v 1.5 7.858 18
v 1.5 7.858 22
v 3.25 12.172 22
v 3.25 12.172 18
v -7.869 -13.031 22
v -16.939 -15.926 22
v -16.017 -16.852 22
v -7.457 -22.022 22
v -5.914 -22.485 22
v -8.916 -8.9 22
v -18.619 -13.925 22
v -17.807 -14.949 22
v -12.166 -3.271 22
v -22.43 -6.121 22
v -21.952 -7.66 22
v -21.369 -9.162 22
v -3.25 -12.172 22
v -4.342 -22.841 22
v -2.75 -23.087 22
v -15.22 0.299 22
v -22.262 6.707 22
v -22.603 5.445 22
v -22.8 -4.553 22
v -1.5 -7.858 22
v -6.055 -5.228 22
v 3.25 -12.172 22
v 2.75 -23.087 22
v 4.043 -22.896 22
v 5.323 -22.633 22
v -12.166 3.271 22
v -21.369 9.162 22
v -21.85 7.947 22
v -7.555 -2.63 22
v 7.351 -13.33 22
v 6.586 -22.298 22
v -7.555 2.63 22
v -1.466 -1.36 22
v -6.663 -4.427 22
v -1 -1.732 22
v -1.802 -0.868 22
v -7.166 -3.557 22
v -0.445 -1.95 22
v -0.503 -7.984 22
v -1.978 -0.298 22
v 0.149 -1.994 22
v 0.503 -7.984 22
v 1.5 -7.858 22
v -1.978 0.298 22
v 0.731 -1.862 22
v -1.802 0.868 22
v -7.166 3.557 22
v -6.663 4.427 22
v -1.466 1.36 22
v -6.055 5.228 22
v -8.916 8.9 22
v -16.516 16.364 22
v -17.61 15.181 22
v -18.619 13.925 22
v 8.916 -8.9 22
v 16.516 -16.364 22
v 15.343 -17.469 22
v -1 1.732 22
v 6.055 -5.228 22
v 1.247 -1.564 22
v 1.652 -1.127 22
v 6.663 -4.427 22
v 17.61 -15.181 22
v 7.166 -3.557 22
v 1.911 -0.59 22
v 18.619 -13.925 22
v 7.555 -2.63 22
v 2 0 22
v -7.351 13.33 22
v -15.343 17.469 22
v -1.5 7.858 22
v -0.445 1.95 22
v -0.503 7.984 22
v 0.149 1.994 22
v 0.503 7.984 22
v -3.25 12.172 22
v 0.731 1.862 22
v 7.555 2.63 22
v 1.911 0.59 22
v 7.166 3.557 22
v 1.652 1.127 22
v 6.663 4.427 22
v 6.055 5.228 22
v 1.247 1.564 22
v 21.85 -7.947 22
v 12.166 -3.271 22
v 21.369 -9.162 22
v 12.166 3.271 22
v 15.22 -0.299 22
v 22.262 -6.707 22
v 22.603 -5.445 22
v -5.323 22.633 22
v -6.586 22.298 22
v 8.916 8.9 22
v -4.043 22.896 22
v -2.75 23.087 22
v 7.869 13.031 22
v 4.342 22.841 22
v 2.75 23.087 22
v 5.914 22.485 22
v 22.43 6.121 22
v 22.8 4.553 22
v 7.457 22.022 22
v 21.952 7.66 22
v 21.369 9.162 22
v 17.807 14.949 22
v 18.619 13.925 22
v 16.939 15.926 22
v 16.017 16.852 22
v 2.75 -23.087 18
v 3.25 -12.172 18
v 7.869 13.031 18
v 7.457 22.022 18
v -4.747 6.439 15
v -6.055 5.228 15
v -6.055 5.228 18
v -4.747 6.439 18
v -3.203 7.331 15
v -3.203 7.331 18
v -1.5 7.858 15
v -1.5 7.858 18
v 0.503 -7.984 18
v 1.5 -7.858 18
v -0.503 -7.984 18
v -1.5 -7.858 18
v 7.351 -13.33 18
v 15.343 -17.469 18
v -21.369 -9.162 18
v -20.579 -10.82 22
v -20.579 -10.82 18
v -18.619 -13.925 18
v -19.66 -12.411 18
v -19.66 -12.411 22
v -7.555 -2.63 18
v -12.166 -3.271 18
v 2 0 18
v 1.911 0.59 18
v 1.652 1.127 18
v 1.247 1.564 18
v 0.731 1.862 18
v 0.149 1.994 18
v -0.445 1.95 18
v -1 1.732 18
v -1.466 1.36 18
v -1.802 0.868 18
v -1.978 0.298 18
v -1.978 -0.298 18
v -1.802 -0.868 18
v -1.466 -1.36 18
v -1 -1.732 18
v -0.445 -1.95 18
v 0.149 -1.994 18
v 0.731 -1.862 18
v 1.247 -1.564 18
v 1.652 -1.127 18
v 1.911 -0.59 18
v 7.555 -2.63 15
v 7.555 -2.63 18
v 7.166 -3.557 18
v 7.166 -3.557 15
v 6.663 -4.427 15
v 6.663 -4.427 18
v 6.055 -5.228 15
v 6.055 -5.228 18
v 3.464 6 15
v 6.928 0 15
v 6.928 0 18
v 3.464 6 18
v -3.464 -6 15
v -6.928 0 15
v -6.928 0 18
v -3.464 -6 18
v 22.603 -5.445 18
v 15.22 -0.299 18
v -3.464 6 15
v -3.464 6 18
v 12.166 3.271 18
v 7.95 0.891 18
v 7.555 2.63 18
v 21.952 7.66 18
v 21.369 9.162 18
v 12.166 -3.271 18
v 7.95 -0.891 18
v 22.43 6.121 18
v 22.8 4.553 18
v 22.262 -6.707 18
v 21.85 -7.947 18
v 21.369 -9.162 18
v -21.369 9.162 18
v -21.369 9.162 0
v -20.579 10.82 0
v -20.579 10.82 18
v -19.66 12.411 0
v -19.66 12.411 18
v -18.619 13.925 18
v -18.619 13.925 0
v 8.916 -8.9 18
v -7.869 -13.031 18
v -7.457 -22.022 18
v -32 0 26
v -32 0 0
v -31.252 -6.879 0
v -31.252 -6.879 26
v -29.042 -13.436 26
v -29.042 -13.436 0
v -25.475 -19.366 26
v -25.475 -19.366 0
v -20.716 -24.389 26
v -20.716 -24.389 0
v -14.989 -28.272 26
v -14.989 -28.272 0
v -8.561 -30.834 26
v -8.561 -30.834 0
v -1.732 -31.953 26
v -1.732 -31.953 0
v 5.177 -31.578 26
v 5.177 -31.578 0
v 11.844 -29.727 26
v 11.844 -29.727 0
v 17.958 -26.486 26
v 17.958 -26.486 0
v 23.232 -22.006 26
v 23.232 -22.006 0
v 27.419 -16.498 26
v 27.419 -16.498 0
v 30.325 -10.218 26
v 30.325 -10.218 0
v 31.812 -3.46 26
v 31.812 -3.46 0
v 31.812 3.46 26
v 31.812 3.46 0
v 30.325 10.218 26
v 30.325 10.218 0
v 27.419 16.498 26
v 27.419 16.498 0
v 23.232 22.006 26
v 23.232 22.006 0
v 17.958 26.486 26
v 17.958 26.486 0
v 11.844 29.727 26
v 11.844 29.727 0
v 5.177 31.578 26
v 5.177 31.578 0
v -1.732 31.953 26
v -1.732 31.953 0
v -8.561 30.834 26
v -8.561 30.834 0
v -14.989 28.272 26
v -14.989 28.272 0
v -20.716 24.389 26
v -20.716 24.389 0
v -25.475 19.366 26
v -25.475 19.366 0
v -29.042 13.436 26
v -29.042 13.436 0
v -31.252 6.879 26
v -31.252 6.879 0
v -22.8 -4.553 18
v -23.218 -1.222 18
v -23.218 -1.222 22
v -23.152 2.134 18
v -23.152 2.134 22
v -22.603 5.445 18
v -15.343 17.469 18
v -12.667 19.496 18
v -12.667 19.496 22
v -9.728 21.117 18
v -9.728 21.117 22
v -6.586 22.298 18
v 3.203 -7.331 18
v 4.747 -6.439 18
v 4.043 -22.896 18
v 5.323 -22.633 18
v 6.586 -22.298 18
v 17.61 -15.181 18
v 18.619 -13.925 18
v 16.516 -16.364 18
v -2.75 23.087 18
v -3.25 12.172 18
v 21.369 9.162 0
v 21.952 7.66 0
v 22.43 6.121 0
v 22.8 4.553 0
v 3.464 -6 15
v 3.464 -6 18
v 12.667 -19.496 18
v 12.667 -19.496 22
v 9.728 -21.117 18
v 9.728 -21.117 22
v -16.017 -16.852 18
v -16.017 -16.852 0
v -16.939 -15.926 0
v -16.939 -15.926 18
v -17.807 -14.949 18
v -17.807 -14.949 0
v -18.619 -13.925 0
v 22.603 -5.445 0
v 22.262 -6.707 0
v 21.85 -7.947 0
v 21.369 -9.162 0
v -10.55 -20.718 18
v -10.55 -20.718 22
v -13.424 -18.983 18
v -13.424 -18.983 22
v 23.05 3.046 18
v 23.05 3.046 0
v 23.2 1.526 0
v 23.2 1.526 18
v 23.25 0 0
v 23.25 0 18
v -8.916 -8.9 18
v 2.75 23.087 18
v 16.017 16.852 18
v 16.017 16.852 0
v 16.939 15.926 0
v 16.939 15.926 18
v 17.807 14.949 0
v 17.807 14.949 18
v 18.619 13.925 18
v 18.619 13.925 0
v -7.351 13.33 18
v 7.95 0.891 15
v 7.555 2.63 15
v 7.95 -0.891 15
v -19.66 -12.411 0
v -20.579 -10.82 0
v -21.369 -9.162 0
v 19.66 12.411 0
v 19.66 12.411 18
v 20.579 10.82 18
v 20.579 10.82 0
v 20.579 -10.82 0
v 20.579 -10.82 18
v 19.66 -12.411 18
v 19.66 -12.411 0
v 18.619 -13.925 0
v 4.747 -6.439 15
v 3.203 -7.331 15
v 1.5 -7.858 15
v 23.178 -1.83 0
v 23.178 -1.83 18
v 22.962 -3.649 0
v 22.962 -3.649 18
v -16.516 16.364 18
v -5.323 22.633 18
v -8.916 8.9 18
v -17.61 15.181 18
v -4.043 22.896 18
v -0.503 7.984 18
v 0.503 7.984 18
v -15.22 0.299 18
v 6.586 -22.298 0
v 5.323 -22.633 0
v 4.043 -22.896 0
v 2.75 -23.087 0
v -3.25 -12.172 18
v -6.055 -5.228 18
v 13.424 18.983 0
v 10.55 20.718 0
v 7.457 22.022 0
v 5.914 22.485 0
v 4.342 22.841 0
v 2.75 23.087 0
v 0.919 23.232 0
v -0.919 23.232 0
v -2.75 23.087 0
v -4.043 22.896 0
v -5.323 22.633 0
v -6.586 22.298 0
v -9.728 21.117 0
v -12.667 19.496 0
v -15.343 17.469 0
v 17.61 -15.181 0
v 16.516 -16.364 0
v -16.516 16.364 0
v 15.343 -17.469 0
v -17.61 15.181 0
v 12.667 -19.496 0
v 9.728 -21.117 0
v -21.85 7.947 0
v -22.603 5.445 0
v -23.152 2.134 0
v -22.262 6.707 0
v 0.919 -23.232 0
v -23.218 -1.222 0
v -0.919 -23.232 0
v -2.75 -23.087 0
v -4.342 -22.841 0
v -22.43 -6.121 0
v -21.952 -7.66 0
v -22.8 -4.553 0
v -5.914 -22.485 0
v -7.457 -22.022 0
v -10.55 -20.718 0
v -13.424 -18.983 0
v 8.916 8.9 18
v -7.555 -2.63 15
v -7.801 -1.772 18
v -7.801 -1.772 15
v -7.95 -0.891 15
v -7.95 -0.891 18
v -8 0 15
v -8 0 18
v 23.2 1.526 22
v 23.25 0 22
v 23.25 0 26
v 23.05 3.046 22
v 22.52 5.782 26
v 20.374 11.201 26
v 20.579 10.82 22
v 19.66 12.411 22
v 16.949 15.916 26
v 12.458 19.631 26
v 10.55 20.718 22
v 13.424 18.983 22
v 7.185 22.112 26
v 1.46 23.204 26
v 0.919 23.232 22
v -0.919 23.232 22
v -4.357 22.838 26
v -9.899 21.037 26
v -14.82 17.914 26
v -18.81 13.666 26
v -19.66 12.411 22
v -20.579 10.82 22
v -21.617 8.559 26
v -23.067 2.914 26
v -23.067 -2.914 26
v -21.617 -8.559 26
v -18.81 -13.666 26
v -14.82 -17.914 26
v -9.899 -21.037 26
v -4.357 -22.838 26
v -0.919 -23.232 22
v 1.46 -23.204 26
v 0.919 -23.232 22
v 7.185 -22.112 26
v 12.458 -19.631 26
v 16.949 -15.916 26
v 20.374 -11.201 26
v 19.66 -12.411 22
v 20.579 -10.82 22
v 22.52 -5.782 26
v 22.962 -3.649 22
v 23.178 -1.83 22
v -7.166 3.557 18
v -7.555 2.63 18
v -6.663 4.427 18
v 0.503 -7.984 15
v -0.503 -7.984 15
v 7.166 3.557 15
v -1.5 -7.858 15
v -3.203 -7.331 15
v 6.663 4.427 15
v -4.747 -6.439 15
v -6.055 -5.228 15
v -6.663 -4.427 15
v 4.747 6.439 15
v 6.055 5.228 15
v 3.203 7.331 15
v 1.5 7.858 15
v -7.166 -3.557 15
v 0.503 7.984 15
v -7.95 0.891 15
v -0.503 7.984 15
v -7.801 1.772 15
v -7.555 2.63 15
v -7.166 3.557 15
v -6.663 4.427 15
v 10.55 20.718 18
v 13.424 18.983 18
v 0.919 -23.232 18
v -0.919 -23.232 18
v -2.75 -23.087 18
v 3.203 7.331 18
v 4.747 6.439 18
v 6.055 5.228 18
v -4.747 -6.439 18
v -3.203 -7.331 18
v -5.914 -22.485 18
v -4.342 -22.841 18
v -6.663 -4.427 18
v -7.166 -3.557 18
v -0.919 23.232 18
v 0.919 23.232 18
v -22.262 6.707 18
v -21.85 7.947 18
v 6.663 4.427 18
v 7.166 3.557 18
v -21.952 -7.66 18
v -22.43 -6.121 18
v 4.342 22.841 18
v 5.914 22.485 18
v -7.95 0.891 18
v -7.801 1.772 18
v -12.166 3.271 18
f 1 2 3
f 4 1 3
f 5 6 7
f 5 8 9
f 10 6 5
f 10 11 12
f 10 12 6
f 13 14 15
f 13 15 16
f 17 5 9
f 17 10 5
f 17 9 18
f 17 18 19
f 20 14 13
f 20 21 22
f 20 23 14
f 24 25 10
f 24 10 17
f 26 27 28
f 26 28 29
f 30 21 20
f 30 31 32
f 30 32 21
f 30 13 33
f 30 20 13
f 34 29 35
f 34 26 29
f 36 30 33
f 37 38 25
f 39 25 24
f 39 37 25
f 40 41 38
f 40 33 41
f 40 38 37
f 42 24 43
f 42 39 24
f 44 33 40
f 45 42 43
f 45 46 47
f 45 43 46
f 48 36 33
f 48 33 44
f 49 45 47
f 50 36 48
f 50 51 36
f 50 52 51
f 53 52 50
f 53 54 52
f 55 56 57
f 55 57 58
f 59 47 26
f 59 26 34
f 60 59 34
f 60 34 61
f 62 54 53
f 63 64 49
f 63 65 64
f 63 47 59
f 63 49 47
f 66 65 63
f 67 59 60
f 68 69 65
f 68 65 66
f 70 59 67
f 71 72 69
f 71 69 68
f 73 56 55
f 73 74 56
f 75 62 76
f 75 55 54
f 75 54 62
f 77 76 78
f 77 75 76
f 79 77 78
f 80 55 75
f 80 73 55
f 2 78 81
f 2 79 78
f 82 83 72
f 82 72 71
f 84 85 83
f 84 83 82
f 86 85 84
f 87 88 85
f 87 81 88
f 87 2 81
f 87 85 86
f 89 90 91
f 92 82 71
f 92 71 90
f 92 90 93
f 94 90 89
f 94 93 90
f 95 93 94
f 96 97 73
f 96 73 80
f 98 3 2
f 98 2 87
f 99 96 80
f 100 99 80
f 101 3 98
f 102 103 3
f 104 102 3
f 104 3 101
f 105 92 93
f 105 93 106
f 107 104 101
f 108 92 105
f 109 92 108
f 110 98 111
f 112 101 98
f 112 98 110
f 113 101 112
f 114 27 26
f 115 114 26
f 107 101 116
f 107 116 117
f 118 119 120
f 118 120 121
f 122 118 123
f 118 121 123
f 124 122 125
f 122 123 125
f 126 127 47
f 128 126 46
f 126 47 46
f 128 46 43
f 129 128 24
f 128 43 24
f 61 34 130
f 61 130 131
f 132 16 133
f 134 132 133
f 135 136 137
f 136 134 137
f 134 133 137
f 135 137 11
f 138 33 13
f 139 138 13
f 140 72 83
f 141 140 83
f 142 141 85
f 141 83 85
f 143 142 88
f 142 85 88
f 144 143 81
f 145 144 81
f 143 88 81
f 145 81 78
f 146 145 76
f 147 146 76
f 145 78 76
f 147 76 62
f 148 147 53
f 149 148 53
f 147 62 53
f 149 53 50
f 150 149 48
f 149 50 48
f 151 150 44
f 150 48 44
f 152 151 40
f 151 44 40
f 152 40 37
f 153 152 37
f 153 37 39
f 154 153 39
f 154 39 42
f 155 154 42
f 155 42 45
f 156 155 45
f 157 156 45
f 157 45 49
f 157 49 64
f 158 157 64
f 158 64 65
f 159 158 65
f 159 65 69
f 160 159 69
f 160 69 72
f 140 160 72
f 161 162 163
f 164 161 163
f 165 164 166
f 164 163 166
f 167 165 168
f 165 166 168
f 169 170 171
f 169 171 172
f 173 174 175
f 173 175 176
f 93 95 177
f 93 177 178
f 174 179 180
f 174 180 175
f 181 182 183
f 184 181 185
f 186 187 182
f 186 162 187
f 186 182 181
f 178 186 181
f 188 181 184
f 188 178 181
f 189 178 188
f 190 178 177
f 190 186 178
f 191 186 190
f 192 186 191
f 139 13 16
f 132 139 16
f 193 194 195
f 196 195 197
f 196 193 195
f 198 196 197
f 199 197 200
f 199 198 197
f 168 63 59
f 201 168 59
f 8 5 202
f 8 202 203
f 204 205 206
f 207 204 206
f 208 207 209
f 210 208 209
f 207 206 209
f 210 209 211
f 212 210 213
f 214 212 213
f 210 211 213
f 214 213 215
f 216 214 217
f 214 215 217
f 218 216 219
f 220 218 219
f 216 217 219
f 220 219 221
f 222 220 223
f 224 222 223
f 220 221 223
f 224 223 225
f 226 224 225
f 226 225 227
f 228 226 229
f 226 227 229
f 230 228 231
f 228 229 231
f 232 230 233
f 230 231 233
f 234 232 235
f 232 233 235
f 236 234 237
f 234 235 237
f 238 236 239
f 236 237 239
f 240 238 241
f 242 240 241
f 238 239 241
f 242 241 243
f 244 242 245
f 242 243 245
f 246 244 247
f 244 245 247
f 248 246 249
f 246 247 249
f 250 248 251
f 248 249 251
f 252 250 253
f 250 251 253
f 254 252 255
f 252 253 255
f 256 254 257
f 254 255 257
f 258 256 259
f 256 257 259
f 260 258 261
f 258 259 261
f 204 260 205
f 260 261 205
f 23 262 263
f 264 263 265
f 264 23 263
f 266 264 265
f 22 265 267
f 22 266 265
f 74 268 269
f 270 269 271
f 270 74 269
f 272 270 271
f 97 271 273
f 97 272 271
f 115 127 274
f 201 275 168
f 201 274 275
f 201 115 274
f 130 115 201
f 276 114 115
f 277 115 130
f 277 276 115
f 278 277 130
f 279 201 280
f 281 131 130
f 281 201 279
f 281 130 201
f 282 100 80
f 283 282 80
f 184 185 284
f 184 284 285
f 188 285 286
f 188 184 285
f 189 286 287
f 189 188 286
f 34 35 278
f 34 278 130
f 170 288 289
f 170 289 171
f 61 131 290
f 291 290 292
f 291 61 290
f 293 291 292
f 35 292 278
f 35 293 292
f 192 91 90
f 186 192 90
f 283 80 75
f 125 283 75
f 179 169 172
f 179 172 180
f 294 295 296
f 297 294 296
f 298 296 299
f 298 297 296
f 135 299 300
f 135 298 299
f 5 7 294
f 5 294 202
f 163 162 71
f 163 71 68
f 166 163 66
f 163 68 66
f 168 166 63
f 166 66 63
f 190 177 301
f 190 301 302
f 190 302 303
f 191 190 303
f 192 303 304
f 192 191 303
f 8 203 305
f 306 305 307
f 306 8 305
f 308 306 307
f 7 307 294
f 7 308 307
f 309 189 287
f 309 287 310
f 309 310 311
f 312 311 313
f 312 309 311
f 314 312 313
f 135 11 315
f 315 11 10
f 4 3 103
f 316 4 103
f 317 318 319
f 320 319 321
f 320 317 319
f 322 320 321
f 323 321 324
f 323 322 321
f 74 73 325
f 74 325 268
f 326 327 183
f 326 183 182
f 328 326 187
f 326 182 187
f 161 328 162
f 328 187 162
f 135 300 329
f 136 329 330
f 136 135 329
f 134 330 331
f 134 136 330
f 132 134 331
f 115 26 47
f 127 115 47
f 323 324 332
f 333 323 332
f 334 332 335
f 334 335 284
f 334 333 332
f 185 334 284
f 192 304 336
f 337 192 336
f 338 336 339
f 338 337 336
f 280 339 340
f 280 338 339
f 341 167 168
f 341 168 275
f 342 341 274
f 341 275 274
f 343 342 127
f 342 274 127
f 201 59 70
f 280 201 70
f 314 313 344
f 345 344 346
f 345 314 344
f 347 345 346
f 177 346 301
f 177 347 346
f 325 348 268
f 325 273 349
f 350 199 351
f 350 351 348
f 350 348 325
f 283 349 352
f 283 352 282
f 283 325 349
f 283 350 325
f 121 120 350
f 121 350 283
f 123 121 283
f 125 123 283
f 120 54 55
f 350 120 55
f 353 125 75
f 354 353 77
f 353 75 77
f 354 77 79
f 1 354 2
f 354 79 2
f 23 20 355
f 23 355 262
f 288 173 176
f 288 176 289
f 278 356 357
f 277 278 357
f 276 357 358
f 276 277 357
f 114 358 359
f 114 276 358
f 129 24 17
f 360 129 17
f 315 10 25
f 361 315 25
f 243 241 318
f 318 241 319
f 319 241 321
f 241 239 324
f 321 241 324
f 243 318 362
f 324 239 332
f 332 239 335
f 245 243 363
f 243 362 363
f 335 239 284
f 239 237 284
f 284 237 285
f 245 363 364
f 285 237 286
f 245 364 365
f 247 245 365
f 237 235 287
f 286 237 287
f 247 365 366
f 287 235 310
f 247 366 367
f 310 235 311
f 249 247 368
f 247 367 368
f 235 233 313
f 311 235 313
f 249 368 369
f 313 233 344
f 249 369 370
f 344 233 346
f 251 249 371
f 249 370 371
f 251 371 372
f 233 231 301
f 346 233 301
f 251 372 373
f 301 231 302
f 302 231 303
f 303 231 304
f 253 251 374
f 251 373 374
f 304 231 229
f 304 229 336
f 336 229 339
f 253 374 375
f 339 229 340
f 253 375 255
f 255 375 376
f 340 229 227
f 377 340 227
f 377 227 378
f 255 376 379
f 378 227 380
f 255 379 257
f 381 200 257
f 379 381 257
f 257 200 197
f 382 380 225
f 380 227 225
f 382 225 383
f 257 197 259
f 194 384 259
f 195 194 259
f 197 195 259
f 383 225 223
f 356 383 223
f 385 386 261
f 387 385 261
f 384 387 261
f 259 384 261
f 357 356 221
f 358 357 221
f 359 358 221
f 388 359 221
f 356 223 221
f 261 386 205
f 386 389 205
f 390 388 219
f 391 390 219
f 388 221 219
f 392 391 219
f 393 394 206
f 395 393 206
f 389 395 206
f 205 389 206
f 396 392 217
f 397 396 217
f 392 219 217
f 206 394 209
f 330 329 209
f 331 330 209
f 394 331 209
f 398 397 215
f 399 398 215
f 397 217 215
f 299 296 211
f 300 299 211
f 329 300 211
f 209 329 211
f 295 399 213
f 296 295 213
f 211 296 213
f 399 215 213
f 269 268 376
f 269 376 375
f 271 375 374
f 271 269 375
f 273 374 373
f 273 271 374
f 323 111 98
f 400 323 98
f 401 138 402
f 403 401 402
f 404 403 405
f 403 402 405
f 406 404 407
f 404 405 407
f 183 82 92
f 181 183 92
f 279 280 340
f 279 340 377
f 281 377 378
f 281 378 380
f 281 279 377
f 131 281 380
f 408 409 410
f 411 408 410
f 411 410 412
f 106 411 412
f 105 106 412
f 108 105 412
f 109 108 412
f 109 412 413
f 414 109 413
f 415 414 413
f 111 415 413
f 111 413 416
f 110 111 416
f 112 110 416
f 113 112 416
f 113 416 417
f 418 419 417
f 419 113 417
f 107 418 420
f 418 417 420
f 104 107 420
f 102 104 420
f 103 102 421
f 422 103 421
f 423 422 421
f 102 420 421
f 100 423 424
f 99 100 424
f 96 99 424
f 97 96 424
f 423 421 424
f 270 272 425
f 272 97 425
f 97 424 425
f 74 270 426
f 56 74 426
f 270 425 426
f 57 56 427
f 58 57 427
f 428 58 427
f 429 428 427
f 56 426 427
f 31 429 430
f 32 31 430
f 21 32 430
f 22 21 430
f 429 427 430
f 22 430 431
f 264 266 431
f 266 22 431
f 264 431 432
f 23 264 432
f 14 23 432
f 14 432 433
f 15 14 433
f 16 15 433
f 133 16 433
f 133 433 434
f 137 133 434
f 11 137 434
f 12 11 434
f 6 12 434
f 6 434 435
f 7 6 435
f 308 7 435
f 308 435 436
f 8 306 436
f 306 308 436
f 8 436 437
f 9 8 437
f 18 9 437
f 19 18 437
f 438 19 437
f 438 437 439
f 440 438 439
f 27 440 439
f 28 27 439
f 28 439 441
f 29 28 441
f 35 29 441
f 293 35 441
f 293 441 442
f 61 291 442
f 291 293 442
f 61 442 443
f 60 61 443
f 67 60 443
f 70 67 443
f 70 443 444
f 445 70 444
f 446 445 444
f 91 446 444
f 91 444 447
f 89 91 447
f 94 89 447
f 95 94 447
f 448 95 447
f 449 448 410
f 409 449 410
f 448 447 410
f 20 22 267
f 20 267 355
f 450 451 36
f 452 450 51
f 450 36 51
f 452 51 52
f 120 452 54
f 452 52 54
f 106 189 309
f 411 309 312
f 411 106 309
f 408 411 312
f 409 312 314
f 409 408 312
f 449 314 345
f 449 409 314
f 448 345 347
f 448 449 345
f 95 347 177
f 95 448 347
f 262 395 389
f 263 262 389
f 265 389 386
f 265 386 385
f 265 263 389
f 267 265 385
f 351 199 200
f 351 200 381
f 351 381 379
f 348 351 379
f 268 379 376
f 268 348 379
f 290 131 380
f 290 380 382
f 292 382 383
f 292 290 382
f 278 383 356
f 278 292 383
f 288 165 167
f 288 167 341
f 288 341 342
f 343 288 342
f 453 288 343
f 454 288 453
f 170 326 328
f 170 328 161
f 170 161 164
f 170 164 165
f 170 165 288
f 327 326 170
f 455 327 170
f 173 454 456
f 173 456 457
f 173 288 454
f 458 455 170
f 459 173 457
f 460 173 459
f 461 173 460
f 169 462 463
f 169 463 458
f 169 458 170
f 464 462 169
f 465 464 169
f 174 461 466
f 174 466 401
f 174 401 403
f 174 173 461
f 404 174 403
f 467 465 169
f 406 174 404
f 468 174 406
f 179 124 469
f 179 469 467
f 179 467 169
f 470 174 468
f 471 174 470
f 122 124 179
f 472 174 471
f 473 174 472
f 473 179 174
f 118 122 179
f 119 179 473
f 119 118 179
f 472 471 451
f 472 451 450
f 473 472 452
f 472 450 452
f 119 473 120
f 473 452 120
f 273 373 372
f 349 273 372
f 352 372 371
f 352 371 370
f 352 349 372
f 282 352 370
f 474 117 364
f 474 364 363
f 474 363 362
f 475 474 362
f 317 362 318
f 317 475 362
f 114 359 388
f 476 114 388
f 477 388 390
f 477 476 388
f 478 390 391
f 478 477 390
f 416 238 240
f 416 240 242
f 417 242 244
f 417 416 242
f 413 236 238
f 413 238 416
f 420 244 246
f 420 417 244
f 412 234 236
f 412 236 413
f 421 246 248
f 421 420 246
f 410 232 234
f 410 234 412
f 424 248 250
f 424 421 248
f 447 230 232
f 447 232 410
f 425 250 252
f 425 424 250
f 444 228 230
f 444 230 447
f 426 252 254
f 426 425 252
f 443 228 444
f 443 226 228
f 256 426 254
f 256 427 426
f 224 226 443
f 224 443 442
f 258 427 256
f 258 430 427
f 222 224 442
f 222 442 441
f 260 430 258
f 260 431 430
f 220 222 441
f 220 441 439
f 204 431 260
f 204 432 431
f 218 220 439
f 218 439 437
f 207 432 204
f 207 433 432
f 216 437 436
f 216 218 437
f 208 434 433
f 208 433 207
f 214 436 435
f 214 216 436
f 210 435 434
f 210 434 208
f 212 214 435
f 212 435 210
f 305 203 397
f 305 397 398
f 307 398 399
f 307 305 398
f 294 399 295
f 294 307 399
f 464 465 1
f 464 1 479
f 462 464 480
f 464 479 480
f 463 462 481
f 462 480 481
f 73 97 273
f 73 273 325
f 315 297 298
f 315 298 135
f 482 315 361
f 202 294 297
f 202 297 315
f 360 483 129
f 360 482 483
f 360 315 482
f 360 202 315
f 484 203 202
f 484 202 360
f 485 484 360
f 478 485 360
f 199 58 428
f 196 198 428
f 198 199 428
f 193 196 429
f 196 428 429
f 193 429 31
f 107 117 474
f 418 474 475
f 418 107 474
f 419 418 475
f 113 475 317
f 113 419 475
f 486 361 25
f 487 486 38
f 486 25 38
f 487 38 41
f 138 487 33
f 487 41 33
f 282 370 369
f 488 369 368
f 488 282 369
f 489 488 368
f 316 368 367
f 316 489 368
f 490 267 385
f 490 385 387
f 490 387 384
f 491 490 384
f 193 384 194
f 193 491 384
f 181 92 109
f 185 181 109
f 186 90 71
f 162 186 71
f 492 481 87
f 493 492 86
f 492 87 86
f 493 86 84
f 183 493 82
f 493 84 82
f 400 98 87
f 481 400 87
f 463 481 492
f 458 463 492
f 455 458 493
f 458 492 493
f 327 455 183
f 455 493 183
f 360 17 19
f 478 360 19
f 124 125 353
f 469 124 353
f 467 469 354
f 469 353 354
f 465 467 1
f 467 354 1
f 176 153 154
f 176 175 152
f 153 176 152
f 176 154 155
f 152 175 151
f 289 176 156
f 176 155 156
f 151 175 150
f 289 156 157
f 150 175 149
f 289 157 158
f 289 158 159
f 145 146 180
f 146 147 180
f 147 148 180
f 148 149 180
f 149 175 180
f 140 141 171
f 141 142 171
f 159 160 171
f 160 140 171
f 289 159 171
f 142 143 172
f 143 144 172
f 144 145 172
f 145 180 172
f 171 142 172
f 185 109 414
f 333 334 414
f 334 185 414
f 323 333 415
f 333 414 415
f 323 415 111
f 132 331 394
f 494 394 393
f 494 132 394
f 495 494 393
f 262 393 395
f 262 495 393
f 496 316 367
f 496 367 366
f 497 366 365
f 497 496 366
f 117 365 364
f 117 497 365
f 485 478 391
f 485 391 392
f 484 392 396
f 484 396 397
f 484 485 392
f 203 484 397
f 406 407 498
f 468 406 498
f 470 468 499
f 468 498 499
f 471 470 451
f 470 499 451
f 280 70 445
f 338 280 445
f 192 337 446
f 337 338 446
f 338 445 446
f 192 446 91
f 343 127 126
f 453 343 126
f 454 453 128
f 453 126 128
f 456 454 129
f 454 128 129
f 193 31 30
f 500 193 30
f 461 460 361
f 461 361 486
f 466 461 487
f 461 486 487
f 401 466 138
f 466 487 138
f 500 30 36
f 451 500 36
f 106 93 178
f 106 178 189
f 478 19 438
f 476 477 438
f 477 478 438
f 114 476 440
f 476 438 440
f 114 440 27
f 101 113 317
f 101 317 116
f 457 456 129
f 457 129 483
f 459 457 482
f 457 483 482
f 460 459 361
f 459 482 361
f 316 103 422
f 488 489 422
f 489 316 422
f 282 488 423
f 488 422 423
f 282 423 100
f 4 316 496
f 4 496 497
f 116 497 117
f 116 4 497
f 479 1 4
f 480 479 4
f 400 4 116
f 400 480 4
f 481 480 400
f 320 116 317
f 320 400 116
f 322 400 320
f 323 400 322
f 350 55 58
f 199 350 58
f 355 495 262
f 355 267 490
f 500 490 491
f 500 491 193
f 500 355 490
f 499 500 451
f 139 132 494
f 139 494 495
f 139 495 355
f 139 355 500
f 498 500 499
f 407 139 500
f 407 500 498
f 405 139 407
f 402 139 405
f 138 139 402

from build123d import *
from build123d.topology import SkipClean

# Parameters (mm, degrees)
ESQUISSE1_R                  = 32
BOSS_EXTRU_1_DEPTH           = 26
ESQUISSE3_R                  = 23.25
ENL_V_MAT_EXTRU_2_DEPTH      = 4
ENL_V_START                  = -18
ESQUISSE4_R                  = 23.25
ENL_V_MAT_EXTRU_3_DEPTH      = 18
ESQUISSE6_R                  = 8
BOSS_EXTRU_5_DEPTH           = 3
ESQUISSE2_R                  = 2
ENL_V_MAT_EXTRU_4_DEPTH      = 53.191953403
ENL_V_MAT_EXTRU_5_DEPTH      = 3
ENL_V_MAT_EXTRU_8_DEPTH      = 51.318982502
R_P_TITION_CIRCULAIRE1_COUNT = 6
ENL_V_MAT_EXTRU_9_DEPTH      = 51.318982502
R_P_TITION_CIRCULAIRE2_COUNT = 6


with BuildPart() as part:
    # Esquisse1 → Boss.-Extru.1 (new body)
    with BuildSketch(Plane.XY):
        with Locations(Location((0, 0, 0), (0, 0, 180))):
            Circle(ESQUISSE1_R)
    extrude(amount=BOSS_EXTRU_1_DEPTH)

    # Esquisse3 → Enlèv. mat.-Extru.2 (cut)
    with BuildSketch(Plane.XY.offset(26)):
        Circle(ESQUISSE3_R)
    extrude(amount=-ENL_V_MAT_EXTRU_2_DEPTH, mode=Mode.SUBTRACT)

    # Esquisse4 → Enlèv. mat.-Extru.3 (cut)
    with BuildSketch(Plane(origin=(0, 0, 0), x_dir=(-1, 0, 0), z_dir=(0, 0, -1)).offset(ENL_V_START)):
        with Locations(Location((0, 0, 0), (0, 0, 180))):
            Circle(ESQUISSE4_R)
    extrude(amount=ENL_V_MAT_EXTRU_3_DEPTH, mode=Mode.SUBTRACT)

    # Esquisse6 → Boss.-Extru.5 (add)
    with BuildSketch(Plane(origin=(0, 0, 18), x_dir=(-1, 0, 0), z_dir=(0, 0, -1))):
        Circle(ESQUISSE6_R)
    extrude(amount=BOSS_EXTRU_5_DEPTH)

    # Esquisse2 → Enlèv. mat.-Extru.4 (cut, through all)
    with BuildSketch(Plane.XY.offset(26)):
        Circle(ESQUISSE2_R)
    extrude(amount=-ENL_V_MAT_EXTRU_4_DEPTH, mode=Mode.SUBTRACT)

    # Esquisse7 → Enlèv. mat.-Extru.5 (cut)
    with BuildSketch(Plane(origin=(0, 0, 15), x_dir=(-1, 0, 0), z_dir=(0, 0, -1))):
        Polygon((-3.464101615, 6), (3.464101615, 6), (6.92820323, 0), (3.464101615, -6), (-3.464101615, -6), (-6.92820323, 0), align=None)
    extrude(amount=-ENL_V_MAT_EXTRU_5_DEPTH, mode=Mode.SUBTRACT)

    # Esquisse8 → Enlèv. mat.-Extru.8 (cut, through all)
    with BuildSketch(Plane.XY.offset(22)):
        with BuildLine():
            Line((-3.25, 12.171773317), (-1.5, 7.858116823))
            ThreePointArc((-1.5, 7.858116823), (0, 8), (1.5, 7.858116823))
            Line((1.5, 7.858116823), (3.25, 12.171773317))
            Line((3.25, 12.171773317), (2.75, 23.086792761))
            ThreePointArc((2.75, 23.086792761), (0, 23.25), (-2.75, 23.086792761))
            Line((-2.75, 23.086792761), (-3.25, 12.171773317))
        make_face()
    enl_v_mat_extru_8 = extrude(amount=-ENL_V_MAT_EXTRU_8_DEPTH, mode=Mode.SUBTRACT)

    # Répétition circulaire1: Enlèv. mat.-Extru.8 ×6 about axis
    with SkipClean():  # the faces are left unmerged after this step: merging them gives an invalid solid
        r_p_tition_circulaire1_axis = Axis((0, 0, 0), (0, 0, 1))
        for i in range(1, R_P_TITION_CIRCULAIRE1_COUNT):
            add(enl_v_mat_extru_8.rotate(r_p_tition_circulaire1_axis, i * 360 / R_P_TITION_CIRCULAIRE1_COUNT), mode=Mode.SUBTRACT)
    add(part.part.scale(1), mode=Mode.REPLACE)  # the faces are merged on a copy

    # Esquisse9 → Enlèv. mat.-Extru.9 (cut, through all)
    with BuildSketch(Plane.XY.offset(22)):
        with BuildLine():
            Line((7.868982797, 13.031089676), (7.457138731, 22.021661653))
            ThreePointArc((7.457138731, 22.021661653), (12.01849939, 19.902717714), (16.017447426, 16.852414603))
            Line((16.017447426, 16.852414603), (7.868982797, 13.031089676))
        make_face()
    enl_v_mat_extru_9 = extrude(amount=-ENL_V_MAT_EXTRU_9_DEPTH, mode=Mode.SUBTRACT)

    # Répétition circulaire2: Enlèv. mat.-Extru.9 ×6 about axis
    r_p_tition_circulaire2_axis = Axis((0, 0, 0), (0, 0, 1))
    for i in range(1, R_P_TITION_CIRCULAIRE2_COUNT):
        add(enl_v_mat_extru_9.rotate(r_p_tition_circulaire2_axis, i * 360 / R_P_TITION_CIRCULAIRE2_COUNT), mode=Mode.SUBTRACT)


solid = part.part
